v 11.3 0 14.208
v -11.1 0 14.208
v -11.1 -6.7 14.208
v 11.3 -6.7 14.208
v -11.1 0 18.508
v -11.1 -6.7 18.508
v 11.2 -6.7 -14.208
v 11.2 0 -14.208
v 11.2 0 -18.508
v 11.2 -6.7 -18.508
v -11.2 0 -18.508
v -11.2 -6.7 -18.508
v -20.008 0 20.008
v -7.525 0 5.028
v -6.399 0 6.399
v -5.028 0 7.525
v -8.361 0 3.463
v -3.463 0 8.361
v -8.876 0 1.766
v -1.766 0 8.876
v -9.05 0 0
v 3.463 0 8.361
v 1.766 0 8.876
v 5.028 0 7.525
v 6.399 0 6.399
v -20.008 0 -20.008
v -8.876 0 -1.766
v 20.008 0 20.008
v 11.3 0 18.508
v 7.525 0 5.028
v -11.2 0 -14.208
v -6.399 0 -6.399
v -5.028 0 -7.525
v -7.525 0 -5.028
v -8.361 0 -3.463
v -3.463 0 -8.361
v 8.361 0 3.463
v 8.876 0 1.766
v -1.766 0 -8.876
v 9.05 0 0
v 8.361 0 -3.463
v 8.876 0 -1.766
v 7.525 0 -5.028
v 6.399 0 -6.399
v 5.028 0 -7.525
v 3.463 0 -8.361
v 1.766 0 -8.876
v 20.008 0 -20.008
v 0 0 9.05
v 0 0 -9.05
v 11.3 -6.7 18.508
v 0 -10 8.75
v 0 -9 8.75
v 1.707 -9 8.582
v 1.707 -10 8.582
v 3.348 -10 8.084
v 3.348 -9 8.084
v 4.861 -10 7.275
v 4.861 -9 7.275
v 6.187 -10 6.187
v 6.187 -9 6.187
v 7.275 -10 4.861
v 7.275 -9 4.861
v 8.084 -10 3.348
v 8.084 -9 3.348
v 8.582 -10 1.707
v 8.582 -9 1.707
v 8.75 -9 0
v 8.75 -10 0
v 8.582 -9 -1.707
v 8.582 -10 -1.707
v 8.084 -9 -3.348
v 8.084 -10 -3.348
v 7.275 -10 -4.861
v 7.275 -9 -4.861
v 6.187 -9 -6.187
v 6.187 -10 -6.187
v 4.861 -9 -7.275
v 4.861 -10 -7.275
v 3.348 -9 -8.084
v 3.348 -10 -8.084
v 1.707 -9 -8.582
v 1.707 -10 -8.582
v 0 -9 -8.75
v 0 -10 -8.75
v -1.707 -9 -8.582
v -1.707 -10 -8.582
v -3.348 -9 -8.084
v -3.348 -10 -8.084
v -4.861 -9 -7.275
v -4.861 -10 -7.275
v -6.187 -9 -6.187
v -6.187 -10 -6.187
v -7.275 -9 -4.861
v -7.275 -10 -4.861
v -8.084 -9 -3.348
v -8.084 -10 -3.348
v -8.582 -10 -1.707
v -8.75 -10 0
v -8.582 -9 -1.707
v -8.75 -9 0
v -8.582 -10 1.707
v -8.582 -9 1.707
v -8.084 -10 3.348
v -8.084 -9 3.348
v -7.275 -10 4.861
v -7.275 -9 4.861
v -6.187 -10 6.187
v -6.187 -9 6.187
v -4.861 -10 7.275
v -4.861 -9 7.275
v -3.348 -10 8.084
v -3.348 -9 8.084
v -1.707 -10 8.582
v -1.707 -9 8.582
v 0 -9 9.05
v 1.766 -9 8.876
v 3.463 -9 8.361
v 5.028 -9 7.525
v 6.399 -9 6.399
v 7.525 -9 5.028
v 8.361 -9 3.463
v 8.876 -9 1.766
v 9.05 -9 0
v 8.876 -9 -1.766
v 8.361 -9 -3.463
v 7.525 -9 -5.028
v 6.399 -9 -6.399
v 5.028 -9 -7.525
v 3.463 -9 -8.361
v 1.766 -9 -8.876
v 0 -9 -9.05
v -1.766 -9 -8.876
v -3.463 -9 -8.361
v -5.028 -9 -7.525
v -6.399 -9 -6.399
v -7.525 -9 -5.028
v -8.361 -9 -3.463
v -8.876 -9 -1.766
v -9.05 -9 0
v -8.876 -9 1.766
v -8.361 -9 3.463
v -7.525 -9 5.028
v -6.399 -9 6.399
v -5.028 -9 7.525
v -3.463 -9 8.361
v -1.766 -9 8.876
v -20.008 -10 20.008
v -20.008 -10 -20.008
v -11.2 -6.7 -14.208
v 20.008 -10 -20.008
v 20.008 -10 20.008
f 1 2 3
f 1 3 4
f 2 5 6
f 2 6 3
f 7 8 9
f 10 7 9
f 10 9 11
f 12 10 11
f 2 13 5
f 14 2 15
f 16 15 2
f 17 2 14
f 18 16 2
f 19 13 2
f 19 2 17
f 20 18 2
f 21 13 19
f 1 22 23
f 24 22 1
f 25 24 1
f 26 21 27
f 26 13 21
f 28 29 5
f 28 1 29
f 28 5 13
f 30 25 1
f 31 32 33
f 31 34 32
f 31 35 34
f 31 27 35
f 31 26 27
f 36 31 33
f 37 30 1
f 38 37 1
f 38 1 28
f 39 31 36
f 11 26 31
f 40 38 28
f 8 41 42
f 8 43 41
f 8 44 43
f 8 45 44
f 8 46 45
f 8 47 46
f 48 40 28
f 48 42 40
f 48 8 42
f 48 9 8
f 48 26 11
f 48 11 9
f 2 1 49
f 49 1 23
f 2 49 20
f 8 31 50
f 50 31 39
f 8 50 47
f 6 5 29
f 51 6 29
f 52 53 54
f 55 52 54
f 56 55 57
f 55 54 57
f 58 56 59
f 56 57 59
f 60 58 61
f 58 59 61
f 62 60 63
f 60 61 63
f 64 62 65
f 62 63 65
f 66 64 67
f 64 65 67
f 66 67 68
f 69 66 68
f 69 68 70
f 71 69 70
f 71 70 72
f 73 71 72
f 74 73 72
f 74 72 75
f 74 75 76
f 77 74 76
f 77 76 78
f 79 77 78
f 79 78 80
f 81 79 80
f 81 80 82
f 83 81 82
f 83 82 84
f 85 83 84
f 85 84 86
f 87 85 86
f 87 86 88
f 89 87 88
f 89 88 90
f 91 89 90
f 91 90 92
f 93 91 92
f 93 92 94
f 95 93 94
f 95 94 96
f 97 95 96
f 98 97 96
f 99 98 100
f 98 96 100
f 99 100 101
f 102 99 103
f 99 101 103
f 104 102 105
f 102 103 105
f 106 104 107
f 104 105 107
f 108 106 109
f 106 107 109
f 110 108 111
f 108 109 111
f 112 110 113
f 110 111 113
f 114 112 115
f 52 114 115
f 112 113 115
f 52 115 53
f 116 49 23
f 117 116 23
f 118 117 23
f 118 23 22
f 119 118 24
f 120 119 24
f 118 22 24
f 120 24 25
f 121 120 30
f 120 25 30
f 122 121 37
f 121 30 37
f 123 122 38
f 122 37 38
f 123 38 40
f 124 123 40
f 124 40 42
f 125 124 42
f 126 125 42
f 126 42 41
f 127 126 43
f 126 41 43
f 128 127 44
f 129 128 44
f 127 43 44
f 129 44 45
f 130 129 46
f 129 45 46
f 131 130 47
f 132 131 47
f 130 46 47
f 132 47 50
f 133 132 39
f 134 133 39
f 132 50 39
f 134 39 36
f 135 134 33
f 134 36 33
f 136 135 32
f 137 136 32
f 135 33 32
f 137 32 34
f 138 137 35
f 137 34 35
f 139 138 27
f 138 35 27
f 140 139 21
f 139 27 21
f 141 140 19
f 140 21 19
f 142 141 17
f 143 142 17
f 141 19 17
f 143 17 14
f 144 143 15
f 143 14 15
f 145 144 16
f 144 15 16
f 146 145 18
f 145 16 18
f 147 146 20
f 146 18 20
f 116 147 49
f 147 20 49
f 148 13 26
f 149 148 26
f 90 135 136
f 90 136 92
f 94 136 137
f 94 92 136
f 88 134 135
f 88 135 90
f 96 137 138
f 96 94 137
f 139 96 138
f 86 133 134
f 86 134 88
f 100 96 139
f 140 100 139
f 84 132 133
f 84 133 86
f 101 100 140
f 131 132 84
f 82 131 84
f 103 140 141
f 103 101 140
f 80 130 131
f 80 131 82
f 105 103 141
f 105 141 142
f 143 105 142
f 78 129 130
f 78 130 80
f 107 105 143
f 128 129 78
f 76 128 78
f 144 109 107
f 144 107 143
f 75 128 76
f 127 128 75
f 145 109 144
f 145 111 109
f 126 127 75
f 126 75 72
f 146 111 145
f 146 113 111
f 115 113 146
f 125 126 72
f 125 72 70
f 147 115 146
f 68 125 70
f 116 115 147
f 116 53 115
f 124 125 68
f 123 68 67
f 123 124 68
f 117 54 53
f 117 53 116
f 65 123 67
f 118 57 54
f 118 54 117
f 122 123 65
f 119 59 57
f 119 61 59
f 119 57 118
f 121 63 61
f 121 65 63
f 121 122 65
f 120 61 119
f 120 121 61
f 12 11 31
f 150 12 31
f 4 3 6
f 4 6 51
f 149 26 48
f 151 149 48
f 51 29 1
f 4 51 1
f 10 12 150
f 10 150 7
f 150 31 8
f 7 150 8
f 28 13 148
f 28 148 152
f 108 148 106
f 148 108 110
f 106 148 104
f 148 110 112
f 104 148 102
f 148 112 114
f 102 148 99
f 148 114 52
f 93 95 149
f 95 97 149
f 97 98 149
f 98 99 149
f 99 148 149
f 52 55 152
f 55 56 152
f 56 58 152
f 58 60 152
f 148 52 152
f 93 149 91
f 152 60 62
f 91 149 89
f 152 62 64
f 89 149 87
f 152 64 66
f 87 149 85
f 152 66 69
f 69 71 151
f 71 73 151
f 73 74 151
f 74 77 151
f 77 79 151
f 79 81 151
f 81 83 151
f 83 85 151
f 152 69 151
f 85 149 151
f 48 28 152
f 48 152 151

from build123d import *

# Parameters (mm, degrees)
SKETCH1_W           = 40.015172748
SKETCH1_H           = 40.015172748
BOSS_EXTRUDE1_DEPTH = 10
SKETCH2_R           = 8.75
CUT_EXTRUDE1_DEPTH  = 31.010115378
SKETCH3_W           = 22.4
SKETCH3_H           = 4.3
CUT_EXTRUDE3_DEPTH  = 6.7
SKETCH3_5_R         = 9.05
CUT_EXTRUDE4_DEPTH  = 9


with BuildPart() as part:
    # Sketch1 → Boss-Extrude1 (new body)
    with BuildSketch(Plane(origin=(0, 0, 0), x_dir=(1, 0, 0), z_dir=(0, 1, 0))):
        Rectangle(SKETCH1_W, SKETCH1_H)
    extrude(amount=-BOSS_EXTRUDE1_DEPTH)

    # Sketch2 → Cut-Extrude1 (cut, through all)
    with BuildSketch(Plane(origin=(0, 0, 0), x_dir=(1, 0, 0), z_dir=(0, 1, 0))):
        with Locations(Location((0, 0, 0), (0, 0, 270))):
            Circle(SKETCH2_R)
    extrude(amount=-CUT_EXTRUDE1_DEPTH, mode=Mode.SUBTRACT)

    # Sketch3 → Cut-Extrude3 (cut)
    with BuildSketch(Plane(origin=(0, 0, 0), x_dir=(1, 0, 0), z_dir=(0, 1, 0))):
        Polygon((11.2, 18.507586374), (0, 18.507586374), (-11.2, 18.507586374), (-11.2, 14.207586374), (0, 14.207586374), (11.2, 14.207586374), align=None)
        with Locations((0.1, -16.357586374)):
            Rectangle(SKETCH3_W, SKETCH3_H)
    extrude(amount=-CUT_EXTRUDE3_DEPTH, mode=Mode.SUBTRACT)

    # Sketch3<5> → Cut-Extrude4 (cut)
    with BuildSketch(Plane(origin=(0, 0, 0), x_dir=(1, 0, 0), z_dir=(0, 1, 0))):
        with Locations(Location((0, 0, 0), (0, 0, 270))):
            Circle(SKETCH3_5_R)
    extrude(amount=-CUT_EXTRUDE4_DEPTH, mode=Mode.SUBTRACT)


solid = part.part
